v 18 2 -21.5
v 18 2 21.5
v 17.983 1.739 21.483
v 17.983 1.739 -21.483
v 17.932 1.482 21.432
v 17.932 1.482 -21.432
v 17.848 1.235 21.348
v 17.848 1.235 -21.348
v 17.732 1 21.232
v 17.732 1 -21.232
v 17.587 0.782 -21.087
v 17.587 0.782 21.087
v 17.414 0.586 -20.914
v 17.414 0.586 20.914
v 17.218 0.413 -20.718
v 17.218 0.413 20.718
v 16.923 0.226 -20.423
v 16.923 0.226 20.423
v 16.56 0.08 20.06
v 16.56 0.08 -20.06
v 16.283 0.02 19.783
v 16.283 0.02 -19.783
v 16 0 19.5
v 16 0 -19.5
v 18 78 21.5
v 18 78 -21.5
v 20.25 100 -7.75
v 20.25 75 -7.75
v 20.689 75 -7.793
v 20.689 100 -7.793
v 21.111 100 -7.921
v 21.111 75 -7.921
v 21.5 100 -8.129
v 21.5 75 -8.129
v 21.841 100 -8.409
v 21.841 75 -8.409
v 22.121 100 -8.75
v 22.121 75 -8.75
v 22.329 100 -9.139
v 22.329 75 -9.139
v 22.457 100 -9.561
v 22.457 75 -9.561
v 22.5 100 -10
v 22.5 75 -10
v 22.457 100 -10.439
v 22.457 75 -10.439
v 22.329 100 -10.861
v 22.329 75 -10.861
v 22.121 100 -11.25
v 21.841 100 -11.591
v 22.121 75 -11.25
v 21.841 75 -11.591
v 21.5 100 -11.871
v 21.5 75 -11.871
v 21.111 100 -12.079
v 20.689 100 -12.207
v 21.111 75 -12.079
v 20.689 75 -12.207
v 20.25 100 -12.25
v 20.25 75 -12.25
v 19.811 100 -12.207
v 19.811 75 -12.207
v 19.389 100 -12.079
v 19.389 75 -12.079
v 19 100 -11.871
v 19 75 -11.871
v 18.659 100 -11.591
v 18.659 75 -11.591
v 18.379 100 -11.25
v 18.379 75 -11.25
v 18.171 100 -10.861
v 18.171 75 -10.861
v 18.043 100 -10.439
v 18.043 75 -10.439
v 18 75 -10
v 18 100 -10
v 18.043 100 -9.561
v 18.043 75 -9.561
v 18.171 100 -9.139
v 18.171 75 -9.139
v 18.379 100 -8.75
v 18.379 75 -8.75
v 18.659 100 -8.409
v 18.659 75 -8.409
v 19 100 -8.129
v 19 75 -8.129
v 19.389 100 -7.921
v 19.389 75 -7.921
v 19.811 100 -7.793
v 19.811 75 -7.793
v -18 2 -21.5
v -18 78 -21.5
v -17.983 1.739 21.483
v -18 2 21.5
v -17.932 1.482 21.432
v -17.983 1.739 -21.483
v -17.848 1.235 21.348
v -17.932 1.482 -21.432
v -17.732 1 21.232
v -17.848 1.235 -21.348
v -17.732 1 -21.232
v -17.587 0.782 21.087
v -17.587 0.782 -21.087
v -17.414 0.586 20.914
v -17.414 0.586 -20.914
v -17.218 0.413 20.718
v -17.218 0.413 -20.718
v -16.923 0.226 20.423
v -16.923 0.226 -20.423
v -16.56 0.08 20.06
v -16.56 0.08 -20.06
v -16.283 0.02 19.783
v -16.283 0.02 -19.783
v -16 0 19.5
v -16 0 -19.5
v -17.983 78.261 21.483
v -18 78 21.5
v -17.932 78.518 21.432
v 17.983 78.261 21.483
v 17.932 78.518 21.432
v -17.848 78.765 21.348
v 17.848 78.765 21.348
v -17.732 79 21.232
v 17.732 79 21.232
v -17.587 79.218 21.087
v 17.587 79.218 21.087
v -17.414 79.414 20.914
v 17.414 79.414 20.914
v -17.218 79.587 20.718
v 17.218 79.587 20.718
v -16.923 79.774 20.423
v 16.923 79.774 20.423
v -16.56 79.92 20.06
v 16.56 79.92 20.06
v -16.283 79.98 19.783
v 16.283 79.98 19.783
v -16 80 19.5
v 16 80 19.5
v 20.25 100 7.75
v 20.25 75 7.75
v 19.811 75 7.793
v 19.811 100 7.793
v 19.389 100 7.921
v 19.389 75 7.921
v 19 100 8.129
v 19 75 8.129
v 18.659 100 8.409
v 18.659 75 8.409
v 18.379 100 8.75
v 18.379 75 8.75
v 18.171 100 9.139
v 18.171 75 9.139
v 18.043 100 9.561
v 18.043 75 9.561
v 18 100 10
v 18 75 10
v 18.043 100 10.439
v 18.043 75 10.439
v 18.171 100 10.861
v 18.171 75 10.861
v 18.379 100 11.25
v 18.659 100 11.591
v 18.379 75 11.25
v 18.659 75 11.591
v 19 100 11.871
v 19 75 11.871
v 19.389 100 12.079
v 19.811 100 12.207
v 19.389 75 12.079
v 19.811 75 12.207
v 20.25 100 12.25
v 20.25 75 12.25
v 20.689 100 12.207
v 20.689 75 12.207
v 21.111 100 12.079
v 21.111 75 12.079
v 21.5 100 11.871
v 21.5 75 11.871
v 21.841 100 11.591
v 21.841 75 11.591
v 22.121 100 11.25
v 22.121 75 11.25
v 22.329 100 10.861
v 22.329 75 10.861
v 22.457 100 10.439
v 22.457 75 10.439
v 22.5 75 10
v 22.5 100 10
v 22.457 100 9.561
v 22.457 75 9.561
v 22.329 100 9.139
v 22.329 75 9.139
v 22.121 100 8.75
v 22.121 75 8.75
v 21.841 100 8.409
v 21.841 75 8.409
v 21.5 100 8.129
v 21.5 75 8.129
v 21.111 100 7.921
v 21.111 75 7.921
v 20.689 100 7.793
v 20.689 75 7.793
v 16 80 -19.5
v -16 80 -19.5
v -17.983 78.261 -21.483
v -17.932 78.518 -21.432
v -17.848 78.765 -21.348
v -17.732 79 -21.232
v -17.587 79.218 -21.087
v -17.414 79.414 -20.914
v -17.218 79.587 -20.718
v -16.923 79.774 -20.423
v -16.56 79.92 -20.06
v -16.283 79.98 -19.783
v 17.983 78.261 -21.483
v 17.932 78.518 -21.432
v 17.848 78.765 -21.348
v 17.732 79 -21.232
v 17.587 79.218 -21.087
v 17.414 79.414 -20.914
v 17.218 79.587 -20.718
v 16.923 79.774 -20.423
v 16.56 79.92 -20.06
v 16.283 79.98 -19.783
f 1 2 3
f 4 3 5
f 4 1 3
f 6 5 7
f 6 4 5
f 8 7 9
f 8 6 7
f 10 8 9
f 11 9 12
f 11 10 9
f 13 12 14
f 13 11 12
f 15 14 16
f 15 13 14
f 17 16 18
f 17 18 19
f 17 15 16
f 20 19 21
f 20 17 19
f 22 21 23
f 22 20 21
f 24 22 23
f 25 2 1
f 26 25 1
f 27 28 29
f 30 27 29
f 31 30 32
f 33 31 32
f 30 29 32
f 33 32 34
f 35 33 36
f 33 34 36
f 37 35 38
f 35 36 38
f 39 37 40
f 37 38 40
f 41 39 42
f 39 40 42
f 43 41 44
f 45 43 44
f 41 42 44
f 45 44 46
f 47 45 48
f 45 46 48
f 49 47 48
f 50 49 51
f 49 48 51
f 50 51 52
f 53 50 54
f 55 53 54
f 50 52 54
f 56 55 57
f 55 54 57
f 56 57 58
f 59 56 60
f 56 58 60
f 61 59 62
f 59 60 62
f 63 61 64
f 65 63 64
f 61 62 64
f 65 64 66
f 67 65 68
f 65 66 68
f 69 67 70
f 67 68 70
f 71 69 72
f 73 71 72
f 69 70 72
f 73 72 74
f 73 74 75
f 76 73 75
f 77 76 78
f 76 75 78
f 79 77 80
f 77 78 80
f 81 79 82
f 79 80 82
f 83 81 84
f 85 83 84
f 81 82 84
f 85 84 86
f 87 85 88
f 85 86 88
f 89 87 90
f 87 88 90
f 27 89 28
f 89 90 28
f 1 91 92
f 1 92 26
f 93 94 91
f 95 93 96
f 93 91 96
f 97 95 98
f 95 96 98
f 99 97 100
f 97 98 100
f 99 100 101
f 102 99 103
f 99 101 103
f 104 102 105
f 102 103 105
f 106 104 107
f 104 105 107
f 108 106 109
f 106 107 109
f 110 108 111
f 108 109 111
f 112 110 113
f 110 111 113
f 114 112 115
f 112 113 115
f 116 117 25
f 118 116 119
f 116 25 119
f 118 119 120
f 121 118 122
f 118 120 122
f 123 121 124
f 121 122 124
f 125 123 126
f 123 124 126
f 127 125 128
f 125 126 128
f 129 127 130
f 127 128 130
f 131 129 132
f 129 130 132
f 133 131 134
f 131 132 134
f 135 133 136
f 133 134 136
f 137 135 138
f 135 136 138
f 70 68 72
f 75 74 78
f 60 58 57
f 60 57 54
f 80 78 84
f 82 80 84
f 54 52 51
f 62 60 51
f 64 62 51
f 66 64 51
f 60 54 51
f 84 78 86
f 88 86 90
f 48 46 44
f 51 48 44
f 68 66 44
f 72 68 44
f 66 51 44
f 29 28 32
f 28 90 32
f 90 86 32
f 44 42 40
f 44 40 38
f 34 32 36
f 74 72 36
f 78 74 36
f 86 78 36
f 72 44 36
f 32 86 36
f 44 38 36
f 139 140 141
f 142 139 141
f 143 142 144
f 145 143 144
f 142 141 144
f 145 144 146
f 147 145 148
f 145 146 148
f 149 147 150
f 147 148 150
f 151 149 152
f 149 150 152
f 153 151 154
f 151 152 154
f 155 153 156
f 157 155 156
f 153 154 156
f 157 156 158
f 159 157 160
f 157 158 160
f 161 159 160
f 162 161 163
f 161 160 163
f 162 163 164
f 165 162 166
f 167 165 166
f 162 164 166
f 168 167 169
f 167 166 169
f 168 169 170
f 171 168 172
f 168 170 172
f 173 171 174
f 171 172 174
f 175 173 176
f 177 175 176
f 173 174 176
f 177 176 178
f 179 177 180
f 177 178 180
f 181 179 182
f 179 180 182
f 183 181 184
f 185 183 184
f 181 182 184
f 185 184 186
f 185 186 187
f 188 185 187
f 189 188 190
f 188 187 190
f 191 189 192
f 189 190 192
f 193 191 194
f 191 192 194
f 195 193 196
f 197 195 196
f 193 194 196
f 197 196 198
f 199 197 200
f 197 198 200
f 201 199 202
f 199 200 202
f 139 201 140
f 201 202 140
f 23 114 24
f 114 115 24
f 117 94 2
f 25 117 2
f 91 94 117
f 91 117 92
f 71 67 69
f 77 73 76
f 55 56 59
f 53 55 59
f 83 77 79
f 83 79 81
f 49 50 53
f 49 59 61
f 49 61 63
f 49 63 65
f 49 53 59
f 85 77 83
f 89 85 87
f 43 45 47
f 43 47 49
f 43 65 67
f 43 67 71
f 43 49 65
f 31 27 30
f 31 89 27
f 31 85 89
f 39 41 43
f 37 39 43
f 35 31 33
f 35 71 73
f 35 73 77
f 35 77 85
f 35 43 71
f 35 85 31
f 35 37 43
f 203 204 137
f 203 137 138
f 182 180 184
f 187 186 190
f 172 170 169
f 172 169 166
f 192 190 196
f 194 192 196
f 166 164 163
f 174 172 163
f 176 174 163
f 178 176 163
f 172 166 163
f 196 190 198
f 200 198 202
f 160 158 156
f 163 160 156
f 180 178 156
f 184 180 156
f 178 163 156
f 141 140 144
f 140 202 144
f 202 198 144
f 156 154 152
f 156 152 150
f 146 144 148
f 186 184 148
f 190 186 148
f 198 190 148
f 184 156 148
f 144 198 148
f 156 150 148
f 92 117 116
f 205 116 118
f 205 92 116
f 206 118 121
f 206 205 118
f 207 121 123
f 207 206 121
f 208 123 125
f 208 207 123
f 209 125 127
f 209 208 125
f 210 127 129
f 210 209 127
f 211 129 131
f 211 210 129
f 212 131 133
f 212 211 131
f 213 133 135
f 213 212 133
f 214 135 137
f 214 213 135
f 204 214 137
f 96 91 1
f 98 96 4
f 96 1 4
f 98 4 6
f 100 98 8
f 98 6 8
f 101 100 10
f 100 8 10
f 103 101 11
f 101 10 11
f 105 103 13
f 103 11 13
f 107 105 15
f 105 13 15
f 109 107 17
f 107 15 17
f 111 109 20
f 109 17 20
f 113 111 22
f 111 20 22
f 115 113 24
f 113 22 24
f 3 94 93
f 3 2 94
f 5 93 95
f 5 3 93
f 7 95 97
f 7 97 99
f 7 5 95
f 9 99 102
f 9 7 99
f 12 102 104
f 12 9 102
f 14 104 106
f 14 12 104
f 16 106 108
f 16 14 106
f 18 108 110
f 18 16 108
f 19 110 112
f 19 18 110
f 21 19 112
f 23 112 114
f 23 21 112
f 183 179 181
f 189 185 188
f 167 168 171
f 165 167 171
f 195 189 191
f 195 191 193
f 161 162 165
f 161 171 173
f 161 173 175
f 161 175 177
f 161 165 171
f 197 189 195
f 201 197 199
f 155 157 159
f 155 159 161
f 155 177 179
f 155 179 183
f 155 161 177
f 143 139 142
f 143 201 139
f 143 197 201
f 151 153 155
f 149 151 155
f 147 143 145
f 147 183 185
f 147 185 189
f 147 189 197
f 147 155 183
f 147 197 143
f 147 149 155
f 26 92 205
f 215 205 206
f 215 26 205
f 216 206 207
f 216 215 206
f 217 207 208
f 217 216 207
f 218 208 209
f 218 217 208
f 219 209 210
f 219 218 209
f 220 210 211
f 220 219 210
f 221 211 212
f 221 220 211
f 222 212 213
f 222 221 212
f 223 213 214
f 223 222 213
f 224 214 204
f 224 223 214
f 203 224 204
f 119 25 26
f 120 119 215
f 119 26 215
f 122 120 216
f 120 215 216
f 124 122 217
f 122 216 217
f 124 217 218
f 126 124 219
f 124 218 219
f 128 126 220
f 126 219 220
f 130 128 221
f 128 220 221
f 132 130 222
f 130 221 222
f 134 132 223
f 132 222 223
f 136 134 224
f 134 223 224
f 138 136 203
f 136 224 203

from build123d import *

# Parameters (mm, degrees)
SKETCH1_W                  = 36
SKETCH1_H                  = 43
BOSS_EXTRUDE1_DEPTH        = 80
BOSS_EXTRUDE2_DEPTH        = 20
BOSS_EXTRUDE2_DEPTH_BACK   = 5
SKETCH2_R                  = 2.25
BOSS_EXTRUDE2_2_DEPTH      = 20
BOSS_EXTRUDE2_2_DEPTH_BACK = 5
FILLET1_R                  = 2


with BuildPart() as part:
    # Sketch1 → Boss-Extrude1 (new body)
    with BuildSketch(Plane(origin=(0, 0, 0), x_dir=(1, 0, 0), z_dir=(0, 1, 0))):
        Rectangle(SKETCH1_W, SKETCH1_H)
    extrude(amount=BOSS_EXTRUDE1_DEPTH)

    # Fillet1
    fillet1_edges = [part.edges().sort_by_distance(p)[0] for p in [
        (-18, 80, 0),
        (0, 80, 21.5),
        (18, 80, 0),
        (0, 0, 21.5),
        (-18, 0, 0),
        (0, 0, -21.5),
        (18, 0, 0),
        (0, 80, -21.5),
    ]]
    fillet(fillet1_edges, radius=FILLET1_R)


with BuildPart() as body_2:
    # Sketch2 → Boss-Extrude2 (new, two sides: drawn at the far end of the back side and taken through both)
    with BuildSketch(Plane(origin=(0, 80, 0), x_dir=(1, 0, 0), z_dir=(0, 1, 0)).offset(-BOSS_EXTRUDE2_DEPTH_BACK)):
        with Locations(Location((20.25, 10, 0), (0, 0, 270))):
            Circle(SKETCH2_R)
    extrude(amount=BOSS_EXTRUDE2_DEPTH + BOSS_EXTRUDE2_DEPTH_BACK)


with BuildPart() as body_3:
    # Sketch2 → Boss-Extrude2 2 (new, two sides: drawn at the far end of the back side and taken through both)
    with BuildSketch(Plane(origin=(0, 80, 0), x_dir=(1, 0, 0), z_dir=(0, 1, 0)).offset(-BOSS_EXTRUDE2_2_DEPTH_BACK)):
        with Locations(Location((20.25, -10, 0), (0, 0, 90))):
            Circle(SKETCH2_R)
    extrude(amount=BOSS_EXTRUDE2_2_DEPTH + BOSS_EXTRUDE2_2_DEPTH_BACK)


solid = Compound([part.part, body_2.part, body_3.part])
